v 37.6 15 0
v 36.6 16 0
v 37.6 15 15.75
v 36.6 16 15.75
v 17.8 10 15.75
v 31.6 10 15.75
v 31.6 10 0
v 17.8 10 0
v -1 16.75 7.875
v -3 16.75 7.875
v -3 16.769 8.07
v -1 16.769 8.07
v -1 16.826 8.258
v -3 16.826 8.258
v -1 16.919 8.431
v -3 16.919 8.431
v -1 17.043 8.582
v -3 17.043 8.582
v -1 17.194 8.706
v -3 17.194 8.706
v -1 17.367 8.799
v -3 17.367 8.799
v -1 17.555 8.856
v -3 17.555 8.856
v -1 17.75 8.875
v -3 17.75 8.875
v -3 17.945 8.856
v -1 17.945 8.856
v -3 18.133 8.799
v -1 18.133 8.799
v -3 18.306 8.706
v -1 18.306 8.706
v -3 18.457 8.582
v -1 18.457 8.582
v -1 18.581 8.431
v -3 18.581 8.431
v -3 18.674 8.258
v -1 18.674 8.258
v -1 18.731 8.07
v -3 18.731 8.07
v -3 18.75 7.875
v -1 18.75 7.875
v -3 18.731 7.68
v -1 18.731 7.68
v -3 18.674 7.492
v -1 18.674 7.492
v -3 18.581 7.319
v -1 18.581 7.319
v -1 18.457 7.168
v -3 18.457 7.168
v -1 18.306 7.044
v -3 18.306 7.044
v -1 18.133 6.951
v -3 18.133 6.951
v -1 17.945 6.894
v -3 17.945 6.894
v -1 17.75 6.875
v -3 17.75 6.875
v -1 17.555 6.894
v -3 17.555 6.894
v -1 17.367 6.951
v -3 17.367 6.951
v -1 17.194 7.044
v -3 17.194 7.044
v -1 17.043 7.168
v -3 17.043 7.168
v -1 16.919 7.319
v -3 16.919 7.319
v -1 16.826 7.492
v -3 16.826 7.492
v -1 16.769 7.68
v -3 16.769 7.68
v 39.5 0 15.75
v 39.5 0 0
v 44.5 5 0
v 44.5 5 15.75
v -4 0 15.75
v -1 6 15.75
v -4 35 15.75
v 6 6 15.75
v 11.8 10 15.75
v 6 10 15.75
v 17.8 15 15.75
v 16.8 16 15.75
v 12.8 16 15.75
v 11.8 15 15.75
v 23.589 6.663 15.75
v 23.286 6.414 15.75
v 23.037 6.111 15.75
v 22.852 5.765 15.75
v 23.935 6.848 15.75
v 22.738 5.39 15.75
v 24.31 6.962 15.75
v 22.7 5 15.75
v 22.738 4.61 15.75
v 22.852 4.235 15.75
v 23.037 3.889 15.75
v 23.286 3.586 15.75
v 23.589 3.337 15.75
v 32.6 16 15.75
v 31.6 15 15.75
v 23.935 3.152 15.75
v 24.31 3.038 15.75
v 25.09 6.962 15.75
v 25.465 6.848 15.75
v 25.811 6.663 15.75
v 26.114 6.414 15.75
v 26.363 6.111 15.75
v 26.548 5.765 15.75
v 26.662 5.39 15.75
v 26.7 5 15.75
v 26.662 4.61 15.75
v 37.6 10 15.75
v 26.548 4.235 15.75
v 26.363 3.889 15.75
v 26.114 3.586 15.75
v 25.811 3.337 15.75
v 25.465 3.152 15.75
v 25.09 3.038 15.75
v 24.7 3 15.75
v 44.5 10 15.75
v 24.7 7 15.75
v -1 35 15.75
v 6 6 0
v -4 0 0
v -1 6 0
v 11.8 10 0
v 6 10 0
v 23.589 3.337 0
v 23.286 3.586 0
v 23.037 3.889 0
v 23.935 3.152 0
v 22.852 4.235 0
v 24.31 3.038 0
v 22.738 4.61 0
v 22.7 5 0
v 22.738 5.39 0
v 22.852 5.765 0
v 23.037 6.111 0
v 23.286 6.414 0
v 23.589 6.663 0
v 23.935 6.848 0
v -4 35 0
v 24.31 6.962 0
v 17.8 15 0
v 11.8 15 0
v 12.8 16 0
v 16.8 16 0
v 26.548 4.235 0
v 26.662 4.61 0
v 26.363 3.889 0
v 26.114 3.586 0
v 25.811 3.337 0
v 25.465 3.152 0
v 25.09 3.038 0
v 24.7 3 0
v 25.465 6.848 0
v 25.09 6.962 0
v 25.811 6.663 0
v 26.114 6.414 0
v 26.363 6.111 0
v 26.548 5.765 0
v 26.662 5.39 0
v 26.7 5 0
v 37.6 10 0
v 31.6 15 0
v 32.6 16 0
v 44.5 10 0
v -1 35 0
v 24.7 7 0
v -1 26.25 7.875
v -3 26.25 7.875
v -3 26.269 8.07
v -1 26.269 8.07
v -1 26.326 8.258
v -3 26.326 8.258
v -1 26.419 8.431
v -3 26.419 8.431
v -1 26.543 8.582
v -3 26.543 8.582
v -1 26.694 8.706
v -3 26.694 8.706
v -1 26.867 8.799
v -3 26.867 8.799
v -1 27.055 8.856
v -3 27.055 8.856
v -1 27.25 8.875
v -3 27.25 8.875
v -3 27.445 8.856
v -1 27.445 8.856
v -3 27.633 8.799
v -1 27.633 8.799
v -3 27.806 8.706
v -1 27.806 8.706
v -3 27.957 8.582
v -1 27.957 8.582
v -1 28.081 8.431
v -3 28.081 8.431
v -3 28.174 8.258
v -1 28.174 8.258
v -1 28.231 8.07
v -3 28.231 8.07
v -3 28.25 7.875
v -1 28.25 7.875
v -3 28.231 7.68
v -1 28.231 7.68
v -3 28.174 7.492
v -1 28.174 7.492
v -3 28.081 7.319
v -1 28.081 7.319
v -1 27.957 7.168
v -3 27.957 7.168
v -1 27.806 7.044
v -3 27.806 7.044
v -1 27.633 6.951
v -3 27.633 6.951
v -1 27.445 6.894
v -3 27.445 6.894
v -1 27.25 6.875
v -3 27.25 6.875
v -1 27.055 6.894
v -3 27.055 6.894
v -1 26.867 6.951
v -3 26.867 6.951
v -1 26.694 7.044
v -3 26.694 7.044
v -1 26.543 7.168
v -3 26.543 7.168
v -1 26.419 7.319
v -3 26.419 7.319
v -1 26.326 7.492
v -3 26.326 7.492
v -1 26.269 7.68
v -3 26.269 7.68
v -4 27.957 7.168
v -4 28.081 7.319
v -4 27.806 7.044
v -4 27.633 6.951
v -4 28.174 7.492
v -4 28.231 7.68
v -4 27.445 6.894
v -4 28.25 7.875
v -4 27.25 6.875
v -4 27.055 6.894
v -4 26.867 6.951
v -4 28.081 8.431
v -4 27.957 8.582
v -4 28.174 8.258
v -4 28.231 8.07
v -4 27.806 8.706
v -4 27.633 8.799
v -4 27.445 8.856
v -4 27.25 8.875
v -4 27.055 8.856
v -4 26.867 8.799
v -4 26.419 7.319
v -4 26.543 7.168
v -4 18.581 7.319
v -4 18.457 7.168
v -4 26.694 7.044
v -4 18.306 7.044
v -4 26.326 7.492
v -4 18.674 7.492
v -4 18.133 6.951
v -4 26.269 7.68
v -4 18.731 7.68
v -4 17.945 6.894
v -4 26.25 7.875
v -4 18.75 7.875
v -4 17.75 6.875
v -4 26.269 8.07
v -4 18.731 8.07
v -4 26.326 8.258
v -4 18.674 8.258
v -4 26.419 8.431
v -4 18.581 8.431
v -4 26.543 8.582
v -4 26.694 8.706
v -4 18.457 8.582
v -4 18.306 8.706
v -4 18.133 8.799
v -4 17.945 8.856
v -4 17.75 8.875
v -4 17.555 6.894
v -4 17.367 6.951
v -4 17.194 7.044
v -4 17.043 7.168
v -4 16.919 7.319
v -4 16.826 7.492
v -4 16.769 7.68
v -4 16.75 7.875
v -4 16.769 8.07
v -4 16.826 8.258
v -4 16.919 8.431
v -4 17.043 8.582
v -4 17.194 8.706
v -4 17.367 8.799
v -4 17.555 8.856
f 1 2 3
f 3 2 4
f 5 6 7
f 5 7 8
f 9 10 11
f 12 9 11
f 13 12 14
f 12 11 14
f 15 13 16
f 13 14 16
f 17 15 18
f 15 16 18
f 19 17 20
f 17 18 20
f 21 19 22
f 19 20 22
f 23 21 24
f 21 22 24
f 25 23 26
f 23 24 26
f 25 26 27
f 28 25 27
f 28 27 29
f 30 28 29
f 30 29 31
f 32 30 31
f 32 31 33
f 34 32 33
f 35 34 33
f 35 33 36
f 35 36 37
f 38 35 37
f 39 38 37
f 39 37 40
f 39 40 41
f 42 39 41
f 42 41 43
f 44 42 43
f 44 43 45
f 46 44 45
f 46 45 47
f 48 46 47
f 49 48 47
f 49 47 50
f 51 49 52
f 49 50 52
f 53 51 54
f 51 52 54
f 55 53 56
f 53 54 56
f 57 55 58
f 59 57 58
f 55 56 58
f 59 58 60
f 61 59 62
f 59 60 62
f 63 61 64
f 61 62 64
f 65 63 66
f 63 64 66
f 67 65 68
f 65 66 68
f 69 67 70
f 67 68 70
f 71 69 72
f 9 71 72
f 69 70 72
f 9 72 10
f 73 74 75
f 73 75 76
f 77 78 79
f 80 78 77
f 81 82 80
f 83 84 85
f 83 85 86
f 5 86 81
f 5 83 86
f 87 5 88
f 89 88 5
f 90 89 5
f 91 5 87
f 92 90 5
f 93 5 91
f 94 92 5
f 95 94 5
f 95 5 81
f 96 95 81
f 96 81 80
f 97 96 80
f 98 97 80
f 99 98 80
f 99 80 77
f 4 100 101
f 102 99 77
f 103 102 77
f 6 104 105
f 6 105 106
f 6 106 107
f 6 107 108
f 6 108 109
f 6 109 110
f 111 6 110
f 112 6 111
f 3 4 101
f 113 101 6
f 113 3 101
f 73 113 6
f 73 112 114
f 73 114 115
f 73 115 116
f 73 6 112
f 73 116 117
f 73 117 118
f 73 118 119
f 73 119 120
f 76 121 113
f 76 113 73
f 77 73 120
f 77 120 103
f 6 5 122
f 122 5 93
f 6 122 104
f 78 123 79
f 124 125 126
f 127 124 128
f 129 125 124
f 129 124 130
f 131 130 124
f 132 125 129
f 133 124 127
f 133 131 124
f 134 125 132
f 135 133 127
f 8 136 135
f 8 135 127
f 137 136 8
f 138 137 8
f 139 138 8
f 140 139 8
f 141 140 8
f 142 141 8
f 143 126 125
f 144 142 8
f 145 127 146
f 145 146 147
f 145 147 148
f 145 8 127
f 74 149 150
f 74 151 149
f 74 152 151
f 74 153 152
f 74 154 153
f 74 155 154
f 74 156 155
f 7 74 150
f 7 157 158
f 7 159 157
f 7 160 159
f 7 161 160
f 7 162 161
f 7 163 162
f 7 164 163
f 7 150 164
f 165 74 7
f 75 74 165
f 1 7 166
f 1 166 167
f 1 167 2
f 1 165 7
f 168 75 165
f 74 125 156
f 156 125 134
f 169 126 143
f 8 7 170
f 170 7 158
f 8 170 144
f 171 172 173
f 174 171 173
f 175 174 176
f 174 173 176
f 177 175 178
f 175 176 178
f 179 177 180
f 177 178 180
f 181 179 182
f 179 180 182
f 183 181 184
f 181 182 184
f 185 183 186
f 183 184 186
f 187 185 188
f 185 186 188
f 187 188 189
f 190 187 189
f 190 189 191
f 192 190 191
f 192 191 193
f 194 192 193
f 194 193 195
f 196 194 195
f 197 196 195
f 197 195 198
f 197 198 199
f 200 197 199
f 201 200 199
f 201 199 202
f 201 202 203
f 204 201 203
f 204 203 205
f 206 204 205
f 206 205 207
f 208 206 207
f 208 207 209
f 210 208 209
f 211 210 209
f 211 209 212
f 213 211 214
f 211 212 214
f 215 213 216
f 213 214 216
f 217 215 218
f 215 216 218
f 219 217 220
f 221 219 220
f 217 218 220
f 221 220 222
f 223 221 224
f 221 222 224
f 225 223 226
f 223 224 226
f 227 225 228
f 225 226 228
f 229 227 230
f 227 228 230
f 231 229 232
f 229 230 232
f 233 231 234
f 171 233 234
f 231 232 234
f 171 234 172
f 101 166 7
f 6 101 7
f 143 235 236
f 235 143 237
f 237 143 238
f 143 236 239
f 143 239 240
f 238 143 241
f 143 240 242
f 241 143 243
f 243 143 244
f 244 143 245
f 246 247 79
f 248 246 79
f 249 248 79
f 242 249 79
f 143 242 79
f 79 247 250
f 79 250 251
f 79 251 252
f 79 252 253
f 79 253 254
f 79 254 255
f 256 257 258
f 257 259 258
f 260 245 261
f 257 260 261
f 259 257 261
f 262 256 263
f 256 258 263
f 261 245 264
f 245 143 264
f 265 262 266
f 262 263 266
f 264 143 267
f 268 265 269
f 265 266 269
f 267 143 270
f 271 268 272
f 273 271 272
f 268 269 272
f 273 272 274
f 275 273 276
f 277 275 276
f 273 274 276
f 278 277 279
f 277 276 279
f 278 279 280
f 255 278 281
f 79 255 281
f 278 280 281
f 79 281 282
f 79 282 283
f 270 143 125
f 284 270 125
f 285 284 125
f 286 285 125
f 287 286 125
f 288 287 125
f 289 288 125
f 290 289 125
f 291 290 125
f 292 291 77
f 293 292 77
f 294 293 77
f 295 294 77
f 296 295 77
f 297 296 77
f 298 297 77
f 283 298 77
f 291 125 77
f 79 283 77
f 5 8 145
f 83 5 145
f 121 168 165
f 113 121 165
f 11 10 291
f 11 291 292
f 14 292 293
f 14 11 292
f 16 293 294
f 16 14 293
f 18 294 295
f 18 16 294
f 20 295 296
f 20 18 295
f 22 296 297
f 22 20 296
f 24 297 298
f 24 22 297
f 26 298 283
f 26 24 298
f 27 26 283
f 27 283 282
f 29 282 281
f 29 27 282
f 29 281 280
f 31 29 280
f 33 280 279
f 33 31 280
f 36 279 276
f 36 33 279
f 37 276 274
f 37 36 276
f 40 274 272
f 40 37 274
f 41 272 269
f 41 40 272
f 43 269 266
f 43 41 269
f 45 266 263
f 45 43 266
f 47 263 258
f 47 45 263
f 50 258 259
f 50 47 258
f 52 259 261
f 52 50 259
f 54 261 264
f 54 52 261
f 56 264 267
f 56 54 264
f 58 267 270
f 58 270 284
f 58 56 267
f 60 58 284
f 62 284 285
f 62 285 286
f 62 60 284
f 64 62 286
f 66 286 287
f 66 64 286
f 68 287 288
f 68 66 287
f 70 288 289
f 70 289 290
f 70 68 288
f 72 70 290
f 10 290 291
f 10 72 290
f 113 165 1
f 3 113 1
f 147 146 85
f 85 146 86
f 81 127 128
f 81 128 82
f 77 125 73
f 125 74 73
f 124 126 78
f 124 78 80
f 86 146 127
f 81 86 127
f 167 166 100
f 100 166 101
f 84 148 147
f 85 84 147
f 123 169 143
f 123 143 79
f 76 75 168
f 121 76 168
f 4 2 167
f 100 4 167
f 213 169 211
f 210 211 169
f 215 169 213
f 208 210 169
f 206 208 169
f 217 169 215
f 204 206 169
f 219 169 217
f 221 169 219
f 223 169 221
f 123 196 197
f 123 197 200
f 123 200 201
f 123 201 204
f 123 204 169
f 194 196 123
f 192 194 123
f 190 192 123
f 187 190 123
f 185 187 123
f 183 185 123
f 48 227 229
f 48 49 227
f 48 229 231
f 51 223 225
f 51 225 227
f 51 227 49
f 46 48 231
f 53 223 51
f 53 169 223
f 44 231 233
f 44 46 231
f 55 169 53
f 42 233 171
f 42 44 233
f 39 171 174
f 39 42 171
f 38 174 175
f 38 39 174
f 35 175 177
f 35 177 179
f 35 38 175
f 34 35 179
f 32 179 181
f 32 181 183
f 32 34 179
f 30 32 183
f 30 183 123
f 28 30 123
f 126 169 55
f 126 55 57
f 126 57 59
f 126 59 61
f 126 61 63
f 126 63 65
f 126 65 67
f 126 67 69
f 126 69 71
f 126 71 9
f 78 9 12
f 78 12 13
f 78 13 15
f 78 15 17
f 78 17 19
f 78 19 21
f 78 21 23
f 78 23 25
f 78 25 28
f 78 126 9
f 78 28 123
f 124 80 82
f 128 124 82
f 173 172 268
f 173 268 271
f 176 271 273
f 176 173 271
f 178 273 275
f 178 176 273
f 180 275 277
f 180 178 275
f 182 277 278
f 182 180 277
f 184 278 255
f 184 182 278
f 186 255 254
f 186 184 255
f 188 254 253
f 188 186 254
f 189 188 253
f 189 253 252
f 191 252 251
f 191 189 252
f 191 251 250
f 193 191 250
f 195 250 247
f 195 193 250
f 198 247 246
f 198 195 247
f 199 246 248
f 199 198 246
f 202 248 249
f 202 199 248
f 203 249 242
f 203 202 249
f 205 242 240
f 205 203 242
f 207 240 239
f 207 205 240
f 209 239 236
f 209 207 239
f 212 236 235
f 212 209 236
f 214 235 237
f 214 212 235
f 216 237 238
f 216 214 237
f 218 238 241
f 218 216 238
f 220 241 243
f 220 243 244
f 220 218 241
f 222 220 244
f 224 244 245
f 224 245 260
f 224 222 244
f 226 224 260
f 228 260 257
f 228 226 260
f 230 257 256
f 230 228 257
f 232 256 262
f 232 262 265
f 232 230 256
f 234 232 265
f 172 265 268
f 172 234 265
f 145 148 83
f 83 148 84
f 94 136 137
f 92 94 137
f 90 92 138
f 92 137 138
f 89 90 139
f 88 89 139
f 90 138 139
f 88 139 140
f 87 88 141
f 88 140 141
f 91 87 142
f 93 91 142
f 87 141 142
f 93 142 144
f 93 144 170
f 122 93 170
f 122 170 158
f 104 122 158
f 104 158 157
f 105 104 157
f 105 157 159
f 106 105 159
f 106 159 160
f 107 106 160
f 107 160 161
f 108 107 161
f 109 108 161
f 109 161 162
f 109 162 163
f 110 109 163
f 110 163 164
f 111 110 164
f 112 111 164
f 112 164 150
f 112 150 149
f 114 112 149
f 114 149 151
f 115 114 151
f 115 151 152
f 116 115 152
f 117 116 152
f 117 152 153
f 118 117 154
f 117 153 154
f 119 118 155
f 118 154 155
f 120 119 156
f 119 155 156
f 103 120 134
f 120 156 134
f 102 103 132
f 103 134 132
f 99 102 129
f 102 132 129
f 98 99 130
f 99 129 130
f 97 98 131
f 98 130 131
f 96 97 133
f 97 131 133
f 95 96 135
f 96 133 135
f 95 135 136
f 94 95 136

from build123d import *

# Parameters (mm, degrees)
F1_DEPTH  = 15.75
F4_D      = 4
F5_DEPTH  = 3
F6_W      = 3
F6_H      = 15.75
F7_DEPTH  = 25
F9_D      = 2
F10_W     = 6
F10_H     = 4
F11_DEPTH = 15.751
F12_SIZE  = 1
F13_SIZE  = 5
F14_DEPTH = 1
F15_DEPTH = 1


with BuildPart() as f1:
    # F0 (on Top) → F1 (new body)
    with BuildSketch(Plane.XY):
        Polygon((0, 0), (44.5, 0), (44.5, 10), (37.6, 10), (37.6, 16), (31.6, 16), (31.6, 10), (17.8, 10), (17.8, 16), (11.8, 16), (11.8, 10), (0, 10), align=None)
    extrude(amount=F1_DEPTH)

    # F4 (through all)
    with Locations(Plane.XY.offset(15.75)):
        with Locations((24.7, 5)):
            Hole(F4_D / 2)

    # F5 (add): a face of the model
    f5_faces = [f1.faces().sort_by_distance(p)[0] for p in [
        (0, 5, 7.875),
    ]]
    extrude(f5_faces, amount=F5_DEPTH)

    # F6 (on face) → F7 (join)
    with BuildSketch(Plane(origin=(0, 10, 0), x_dir=(-1, 0, 0), z_dir=(0, 1, 0))):
        with Locations((1.5, 7.875)):
            Rectangle(F6_W, F6_H)
    extrude(amount=F7_DEPTH)

    # F9 (through all)
    with Locations(Plane.YZ):
        with Locations((27.25, 7.875), (17.75, 7.875)):
            Hole(F9_D / 2)

    # F10 (on face) → F11 (cut, through all)
    with BuildSketch(Plane.XY.offset(15.75)):
        with Locations((3, 8)):
            Rectangle(F10_W, F10_H)
    extrude(amount=-F11_DEPTH, mode=Mode.SUBTRACT)

    # F12
    f12_edges = [f1.edges().sort_by_distance(p)[0] for p in [
        (11.8, 16, 7.875),
        (17.8, 16, 7.875),
        (31.6, 16, 7.875),
        (37.6, 16, 7.875),
    ]]
    chamfer(f12_edges, length=F12_SIZE)

    # F13
    f13_edges = [f1.edges().sort_by_distance(p)[0] for p in [
        (44.5, 0, 7.875),
    ]]
    chamfer(f13_edges, length=F13_SIZE)

    # F14 (add): a face of the model
    f14_faces = [f1.faces().sort_by_distance(p)[0] for p in [
        (-3, 0.3838049635, 7.875),
    ]]
    extrude(f14_faces, amount=F14_DEPTH)

    # F15 (cut): a face of the model
    f15_faces = [f1.faces().sort_by_distance(p)[0] for p in [
        (0, 20.4721036707, 7.875),
    ]]
    extrude(f15_faces, amount=-F15_DEPTH, mode=Mode.SUBTRACT)


solid = f1.part
